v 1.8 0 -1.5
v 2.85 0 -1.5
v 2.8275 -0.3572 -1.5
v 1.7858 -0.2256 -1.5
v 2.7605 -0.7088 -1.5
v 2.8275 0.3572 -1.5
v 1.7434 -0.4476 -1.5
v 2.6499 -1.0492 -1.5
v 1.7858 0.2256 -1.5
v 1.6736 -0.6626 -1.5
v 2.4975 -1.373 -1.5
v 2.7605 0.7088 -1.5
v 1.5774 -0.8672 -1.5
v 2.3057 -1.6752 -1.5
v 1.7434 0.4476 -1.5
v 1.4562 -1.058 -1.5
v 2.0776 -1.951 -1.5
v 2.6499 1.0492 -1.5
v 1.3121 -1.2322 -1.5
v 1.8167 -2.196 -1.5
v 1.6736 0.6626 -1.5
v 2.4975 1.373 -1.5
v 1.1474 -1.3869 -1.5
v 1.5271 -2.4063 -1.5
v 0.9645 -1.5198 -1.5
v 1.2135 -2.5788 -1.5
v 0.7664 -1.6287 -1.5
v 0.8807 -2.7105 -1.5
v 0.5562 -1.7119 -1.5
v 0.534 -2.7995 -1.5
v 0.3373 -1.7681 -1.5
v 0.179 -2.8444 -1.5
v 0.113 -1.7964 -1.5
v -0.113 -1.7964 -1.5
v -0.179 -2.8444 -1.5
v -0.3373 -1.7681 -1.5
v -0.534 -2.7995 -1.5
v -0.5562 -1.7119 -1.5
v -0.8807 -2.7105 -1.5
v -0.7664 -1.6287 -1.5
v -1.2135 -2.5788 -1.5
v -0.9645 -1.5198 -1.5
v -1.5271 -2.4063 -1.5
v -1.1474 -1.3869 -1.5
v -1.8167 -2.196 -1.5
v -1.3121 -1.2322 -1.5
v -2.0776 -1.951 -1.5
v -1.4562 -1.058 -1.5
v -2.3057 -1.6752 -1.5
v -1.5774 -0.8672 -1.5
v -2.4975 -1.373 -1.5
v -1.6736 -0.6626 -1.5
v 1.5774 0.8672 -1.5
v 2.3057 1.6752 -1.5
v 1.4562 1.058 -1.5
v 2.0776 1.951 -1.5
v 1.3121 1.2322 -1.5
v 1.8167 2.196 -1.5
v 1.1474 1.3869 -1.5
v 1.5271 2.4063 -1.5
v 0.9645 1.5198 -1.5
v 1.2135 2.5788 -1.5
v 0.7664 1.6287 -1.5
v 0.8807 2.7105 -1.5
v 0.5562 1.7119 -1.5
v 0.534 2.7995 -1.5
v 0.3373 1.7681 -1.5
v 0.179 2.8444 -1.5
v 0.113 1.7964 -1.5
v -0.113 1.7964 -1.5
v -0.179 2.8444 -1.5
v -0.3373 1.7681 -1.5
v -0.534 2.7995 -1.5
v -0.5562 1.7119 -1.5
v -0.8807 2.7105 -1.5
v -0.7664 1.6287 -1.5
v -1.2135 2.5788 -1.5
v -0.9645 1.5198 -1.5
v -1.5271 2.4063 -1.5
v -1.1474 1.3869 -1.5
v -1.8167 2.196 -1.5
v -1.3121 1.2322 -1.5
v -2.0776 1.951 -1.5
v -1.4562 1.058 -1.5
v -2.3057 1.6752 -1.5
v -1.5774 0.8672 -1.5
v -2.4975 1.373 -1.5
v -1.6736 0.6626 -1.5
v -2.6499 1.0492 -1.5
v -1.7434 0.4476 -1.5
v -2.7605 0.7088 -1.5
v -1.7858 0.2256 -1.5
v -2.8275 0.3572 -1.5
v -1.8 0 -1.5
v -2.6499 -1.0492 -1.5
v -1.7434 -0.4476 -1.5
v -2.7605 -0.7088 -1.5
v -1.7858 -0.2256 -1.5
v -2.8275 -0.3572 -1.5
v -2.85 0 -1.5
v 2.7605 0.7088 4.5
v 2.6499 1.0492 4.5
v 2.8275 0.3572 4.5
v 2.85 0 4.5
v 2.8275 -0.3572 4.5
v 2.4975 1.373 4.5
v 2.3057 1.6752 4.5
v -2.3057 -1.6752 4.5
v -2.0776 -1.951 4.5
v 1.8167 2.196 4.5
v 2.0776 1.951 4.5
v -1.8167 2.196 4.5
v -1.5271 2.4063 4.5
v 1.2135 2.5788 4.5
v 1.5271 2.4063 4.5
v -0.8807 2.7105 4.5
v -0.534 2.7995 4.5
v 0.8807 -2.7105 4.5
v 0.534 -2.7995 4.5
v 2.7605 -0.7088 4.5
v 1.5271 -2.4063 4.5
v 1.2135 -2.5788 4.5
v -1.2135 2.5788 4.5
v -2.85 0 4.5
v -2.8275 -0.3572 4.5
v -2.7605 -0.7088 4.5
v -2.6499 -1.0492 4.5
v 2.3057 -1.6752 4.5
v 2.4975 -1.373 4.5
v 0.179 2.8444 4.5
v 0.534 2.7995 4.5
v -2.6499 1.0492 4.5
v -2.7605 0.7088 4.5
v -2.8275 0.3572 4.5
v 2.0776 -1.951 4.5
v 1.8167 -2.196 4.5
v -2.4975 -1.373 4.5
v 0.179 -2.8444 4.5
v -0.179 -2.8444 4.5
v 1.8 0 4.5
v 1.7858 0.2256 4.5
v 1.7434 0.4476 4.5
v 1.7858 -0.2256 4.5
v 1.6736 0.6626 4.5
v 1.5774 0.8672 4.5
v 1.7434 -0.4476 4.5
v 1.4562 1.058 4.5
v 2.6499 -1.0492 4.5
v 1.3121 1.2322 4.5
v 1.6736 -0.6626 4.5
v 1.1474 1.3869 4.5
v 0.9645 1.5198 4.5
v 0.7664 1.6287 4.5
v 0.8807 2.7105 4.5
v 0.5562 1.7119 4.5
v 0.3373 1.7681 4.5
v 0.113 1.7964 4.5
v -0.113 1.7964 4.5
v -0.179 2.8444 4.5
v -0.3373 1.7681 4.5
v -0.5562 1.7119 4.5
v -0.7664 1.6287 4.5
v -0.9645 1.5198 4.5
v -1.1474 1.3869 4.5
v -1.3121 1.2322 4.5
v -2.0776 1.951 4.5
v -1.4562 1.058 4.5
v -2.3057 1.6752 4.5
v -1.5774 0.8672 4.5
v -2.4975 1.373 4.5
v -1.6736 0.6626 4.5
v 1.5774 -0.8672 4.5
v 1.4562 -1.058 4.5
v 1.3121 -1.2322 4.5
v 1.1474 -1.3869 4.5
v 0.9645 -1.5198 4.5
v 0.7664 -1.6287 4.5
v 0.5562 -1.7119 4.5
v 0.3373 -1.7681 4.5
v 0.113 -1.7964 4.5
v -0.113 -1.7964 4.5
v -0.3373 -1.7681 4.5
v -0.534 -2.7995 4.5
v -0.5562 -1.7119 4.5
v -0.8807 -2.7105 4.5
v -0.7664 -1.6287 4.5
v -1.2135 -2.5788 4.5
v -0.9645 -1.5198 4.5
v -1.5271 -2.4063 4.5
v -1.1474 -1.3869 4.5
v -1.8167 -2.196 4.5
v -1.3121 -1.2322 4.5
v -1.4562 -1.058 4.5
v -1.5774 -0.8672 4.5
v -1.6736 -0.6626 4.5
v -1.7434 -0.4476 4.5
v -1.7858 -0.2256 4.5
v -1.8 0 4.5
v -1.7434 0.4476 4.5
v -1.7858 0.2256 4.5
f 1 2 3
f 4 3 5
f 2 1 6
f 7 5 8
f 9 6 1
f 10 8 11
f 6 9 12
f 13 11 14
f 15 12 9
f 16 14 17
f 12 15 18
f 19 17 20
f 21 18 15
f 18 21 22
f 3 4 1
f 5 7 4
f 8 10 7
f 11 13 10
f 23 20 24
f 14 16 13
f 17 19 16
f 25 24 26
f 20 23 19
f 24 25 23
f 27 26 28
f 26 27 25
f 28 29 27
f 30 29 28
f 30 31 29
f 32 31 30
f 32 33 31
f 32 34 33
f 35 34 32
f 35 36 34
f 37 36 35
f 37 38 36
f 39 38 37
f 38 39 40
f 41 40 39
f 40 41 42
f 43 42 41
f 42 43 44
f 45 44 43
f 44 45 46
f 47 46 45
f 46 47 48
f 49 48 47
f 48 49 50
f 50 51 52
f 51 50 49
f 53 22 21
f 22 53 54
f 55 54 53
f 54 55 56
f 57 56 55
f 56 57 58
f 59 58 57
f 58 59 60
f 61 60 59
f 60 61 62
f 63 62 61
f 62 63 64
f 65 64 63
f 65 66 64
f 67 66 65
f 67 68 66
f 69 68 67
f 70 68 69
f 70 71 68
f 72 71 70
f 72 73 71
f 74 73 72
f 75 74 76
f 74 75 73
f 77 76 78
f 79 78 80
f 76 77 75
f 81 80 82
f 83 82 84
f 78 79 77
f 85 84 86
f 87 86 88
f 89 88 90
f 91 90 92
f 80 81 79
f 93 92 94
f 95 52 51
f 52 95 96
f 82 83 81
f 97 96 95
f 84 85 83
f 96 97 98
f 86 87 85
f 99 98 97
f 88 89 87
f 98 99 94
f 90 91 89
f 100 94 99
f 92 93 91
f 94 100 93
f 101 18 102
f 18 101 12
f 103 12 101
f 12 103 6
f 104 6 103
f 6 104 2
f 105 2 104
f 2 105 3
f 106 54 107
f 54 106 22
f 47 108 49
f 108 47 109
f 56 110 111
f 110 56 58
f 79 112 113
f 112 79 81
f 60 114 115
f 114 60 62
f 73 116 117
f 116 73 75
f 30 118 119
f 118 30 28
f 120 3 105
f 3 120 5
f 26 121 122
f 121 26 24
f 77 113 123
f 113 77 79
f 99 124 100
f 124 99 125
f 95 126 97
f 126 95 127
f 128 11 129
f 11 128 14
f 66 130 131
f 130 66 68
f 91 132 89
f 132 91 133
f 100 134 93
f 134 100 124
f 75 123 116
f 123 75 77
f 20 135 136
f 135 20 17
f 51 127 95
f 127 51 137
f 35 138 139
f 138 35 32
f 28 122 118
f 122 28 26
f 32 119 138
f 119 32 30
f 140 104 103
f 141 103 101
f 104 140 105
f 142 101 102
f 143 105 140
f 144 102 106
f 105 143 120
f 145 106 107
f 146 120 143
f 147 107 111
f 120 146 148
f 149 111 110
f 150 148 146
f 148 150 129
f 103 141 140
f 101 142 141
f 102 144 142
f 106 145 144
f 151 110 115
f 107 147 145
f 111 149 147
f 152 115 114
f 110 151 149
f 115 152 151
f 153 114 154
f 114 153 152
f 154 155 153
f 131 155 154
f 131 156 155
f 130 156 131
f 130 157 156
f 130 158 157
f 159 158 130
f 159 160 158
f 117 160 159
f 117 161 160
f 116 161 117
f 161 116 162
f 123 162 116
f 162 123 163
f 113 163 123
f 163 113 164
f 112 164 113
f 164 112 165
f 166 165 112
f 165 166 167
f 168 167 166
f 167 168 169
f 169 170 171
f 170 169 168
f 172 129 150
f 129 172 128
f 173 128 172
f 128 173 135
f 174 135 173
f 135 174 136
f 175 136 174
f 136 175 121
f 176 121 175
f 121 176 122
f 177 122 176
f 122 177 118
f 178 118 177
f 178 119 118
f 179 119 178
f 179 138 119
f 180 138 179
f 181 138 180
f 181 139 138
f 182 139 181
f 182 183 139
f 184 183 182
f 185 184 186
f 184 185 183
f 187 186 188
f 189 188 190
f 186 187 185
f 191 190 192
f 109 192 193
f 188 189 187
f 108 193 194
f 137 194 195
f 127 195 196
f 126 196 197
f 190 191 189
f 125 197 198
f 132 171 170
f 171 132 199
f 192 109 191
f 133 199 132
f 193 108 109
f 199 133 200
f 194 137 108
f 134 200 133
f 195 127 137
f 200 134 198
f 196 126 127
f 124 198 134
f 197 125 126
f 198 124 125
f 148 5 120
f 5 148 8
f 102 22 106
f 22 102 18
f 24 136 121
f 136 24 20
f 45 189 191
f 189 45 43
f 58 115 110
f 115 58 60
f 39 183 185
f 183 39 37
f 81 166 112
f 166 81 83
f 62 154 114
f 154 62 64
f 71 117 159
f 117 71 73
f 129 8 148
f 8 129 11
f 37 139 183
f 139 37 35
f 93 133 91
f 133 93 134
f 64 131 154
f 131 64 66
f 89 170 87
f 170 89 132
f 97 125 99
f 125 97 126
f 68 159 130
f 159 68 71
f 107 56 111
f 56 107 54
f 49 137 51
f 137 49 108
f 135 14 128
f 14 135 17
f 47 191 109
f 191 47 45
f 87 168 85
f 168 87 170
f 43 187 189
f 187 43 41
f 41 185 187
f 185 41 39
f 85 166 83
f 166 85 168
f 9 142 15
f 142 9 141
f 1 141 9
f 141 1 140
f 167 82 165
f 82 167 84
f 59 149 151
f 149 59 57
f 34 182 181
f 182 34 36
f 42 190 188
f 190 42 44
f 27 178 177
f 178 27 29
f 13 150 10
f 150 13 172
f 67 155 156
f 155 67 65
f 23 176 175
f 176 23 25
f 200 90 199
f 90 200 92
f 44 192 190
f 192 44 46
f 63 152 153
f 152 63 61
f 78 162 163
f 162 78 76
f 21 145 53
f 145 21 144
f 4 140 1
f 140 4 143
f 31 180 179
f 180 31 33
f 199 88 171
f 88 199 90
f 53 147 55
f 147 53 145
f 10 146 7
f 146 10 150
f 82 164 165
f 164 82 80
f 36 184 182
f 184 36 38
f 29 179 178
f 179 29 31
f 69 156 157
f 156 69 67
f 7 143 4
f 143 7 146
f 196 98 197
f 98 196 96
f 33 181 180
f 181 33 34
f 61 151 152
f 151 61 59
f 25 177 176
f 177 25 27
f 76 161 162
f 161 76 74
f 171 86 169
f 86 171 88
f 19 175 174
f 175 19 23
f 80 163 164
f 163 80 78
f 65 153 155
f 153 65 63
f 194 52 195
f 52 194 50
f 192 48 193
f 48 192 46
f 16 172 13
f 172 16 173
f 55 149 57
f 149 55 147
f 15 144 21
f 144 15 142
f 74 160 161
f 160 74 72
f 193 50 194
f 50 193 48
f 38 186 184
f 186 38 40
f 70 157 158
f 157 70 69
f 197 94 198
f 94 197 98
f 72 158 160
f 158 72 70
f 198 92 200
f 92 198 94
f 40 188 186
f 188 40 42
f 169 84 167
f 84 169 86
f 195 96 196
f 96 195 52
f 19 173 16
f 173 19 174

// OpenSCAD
$fn = 50;


difference() {
	union() {
		translate(v = [0, 0, -1.5000000000]) {
			cylinder(h = 3, r = 1.0000000000);
		}
		translate(v = [0, 0, -1.5000000000]) {
			cylinder(h = 6, r = 2.8500000000);
		}
	}
	union() {
		translate(v = [0, 0, -50.0000000000]) {
			cylinder(h = 100, r = 1.8000000000);
		}
	}
}
